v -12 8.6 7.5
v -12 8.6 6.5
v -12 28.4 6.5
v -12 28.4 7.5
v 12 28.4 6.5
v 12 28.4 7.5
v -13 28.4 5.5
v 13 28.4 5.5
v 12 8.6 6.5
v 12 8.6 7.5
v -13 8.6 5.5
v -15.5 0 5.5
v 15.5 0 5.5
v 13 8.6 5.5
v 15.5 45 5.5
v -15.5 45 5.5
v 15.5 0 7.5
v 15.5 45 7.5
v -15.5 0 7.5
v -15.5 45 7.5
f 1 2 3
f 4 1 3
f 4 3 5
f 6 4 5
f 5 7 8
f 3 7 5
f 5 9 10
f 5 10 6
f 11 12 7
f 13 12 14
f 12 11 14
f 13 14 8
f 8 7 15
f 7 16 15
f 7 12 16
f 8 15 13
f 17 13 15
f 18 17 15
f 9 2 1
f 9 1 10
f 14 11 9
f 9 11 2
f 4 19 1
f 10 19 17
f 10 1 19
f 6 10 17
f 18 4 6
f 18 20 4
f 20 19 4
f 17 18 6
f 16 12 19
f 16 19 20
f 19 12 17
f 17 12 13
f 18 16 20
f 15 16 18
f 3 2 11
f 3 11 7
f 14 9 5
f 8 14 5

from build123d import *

# Parameters (mm, degrees)
BOX004_W     = 24
BOX004_H     = 19.8
BOX004_DEPTH = 2
BOX002_W     = 31
BOX002_H     = 45
BOX002_DEPTH = 2
CHAMFER_SIZE = 1


with BuildPart() as topplate_cutout:
    # Box004 → Box004 (new body)
    with BuildSketch(Plane(origin=(-12, 8.6, 5.5), x_dir=(1, 0, 0), z_dir=(0, 0, 1))):
        with Locations((12, 9.9)):
            Rectangle(BOX004_W, BOX004_H)
    extrude(amount=BOX004_DEPTH)


with BuildPart() as topplate:
    # Box002 → Box002 (new body)
    with BuildSketch(Plane(origin=(-15.5, 0, 5.5), x_dir=(1, 0, 0), z_dir=(0, 0, 1))):
        with Locations((15.5, 22.5)):
            Rectangle(BOX002_W, BOX002_H)
    extrude(amount=BOX002_DEPTH)

    # Cut014: cut topPlate_cutout
    add(topplate_cutout.part, mode=Mode.SUBTRACT)

    # Chamfer
    chamfer_edges = [topplate.edges().sort_by_distance(p)[0] for p in [
        (-12, 18.5, 5.5),
        (12, 18.5, 5.5),
    ]]
    chamfer(chamfer_edges, length=CHAMFER_SIZE)


solid = topplate.part
